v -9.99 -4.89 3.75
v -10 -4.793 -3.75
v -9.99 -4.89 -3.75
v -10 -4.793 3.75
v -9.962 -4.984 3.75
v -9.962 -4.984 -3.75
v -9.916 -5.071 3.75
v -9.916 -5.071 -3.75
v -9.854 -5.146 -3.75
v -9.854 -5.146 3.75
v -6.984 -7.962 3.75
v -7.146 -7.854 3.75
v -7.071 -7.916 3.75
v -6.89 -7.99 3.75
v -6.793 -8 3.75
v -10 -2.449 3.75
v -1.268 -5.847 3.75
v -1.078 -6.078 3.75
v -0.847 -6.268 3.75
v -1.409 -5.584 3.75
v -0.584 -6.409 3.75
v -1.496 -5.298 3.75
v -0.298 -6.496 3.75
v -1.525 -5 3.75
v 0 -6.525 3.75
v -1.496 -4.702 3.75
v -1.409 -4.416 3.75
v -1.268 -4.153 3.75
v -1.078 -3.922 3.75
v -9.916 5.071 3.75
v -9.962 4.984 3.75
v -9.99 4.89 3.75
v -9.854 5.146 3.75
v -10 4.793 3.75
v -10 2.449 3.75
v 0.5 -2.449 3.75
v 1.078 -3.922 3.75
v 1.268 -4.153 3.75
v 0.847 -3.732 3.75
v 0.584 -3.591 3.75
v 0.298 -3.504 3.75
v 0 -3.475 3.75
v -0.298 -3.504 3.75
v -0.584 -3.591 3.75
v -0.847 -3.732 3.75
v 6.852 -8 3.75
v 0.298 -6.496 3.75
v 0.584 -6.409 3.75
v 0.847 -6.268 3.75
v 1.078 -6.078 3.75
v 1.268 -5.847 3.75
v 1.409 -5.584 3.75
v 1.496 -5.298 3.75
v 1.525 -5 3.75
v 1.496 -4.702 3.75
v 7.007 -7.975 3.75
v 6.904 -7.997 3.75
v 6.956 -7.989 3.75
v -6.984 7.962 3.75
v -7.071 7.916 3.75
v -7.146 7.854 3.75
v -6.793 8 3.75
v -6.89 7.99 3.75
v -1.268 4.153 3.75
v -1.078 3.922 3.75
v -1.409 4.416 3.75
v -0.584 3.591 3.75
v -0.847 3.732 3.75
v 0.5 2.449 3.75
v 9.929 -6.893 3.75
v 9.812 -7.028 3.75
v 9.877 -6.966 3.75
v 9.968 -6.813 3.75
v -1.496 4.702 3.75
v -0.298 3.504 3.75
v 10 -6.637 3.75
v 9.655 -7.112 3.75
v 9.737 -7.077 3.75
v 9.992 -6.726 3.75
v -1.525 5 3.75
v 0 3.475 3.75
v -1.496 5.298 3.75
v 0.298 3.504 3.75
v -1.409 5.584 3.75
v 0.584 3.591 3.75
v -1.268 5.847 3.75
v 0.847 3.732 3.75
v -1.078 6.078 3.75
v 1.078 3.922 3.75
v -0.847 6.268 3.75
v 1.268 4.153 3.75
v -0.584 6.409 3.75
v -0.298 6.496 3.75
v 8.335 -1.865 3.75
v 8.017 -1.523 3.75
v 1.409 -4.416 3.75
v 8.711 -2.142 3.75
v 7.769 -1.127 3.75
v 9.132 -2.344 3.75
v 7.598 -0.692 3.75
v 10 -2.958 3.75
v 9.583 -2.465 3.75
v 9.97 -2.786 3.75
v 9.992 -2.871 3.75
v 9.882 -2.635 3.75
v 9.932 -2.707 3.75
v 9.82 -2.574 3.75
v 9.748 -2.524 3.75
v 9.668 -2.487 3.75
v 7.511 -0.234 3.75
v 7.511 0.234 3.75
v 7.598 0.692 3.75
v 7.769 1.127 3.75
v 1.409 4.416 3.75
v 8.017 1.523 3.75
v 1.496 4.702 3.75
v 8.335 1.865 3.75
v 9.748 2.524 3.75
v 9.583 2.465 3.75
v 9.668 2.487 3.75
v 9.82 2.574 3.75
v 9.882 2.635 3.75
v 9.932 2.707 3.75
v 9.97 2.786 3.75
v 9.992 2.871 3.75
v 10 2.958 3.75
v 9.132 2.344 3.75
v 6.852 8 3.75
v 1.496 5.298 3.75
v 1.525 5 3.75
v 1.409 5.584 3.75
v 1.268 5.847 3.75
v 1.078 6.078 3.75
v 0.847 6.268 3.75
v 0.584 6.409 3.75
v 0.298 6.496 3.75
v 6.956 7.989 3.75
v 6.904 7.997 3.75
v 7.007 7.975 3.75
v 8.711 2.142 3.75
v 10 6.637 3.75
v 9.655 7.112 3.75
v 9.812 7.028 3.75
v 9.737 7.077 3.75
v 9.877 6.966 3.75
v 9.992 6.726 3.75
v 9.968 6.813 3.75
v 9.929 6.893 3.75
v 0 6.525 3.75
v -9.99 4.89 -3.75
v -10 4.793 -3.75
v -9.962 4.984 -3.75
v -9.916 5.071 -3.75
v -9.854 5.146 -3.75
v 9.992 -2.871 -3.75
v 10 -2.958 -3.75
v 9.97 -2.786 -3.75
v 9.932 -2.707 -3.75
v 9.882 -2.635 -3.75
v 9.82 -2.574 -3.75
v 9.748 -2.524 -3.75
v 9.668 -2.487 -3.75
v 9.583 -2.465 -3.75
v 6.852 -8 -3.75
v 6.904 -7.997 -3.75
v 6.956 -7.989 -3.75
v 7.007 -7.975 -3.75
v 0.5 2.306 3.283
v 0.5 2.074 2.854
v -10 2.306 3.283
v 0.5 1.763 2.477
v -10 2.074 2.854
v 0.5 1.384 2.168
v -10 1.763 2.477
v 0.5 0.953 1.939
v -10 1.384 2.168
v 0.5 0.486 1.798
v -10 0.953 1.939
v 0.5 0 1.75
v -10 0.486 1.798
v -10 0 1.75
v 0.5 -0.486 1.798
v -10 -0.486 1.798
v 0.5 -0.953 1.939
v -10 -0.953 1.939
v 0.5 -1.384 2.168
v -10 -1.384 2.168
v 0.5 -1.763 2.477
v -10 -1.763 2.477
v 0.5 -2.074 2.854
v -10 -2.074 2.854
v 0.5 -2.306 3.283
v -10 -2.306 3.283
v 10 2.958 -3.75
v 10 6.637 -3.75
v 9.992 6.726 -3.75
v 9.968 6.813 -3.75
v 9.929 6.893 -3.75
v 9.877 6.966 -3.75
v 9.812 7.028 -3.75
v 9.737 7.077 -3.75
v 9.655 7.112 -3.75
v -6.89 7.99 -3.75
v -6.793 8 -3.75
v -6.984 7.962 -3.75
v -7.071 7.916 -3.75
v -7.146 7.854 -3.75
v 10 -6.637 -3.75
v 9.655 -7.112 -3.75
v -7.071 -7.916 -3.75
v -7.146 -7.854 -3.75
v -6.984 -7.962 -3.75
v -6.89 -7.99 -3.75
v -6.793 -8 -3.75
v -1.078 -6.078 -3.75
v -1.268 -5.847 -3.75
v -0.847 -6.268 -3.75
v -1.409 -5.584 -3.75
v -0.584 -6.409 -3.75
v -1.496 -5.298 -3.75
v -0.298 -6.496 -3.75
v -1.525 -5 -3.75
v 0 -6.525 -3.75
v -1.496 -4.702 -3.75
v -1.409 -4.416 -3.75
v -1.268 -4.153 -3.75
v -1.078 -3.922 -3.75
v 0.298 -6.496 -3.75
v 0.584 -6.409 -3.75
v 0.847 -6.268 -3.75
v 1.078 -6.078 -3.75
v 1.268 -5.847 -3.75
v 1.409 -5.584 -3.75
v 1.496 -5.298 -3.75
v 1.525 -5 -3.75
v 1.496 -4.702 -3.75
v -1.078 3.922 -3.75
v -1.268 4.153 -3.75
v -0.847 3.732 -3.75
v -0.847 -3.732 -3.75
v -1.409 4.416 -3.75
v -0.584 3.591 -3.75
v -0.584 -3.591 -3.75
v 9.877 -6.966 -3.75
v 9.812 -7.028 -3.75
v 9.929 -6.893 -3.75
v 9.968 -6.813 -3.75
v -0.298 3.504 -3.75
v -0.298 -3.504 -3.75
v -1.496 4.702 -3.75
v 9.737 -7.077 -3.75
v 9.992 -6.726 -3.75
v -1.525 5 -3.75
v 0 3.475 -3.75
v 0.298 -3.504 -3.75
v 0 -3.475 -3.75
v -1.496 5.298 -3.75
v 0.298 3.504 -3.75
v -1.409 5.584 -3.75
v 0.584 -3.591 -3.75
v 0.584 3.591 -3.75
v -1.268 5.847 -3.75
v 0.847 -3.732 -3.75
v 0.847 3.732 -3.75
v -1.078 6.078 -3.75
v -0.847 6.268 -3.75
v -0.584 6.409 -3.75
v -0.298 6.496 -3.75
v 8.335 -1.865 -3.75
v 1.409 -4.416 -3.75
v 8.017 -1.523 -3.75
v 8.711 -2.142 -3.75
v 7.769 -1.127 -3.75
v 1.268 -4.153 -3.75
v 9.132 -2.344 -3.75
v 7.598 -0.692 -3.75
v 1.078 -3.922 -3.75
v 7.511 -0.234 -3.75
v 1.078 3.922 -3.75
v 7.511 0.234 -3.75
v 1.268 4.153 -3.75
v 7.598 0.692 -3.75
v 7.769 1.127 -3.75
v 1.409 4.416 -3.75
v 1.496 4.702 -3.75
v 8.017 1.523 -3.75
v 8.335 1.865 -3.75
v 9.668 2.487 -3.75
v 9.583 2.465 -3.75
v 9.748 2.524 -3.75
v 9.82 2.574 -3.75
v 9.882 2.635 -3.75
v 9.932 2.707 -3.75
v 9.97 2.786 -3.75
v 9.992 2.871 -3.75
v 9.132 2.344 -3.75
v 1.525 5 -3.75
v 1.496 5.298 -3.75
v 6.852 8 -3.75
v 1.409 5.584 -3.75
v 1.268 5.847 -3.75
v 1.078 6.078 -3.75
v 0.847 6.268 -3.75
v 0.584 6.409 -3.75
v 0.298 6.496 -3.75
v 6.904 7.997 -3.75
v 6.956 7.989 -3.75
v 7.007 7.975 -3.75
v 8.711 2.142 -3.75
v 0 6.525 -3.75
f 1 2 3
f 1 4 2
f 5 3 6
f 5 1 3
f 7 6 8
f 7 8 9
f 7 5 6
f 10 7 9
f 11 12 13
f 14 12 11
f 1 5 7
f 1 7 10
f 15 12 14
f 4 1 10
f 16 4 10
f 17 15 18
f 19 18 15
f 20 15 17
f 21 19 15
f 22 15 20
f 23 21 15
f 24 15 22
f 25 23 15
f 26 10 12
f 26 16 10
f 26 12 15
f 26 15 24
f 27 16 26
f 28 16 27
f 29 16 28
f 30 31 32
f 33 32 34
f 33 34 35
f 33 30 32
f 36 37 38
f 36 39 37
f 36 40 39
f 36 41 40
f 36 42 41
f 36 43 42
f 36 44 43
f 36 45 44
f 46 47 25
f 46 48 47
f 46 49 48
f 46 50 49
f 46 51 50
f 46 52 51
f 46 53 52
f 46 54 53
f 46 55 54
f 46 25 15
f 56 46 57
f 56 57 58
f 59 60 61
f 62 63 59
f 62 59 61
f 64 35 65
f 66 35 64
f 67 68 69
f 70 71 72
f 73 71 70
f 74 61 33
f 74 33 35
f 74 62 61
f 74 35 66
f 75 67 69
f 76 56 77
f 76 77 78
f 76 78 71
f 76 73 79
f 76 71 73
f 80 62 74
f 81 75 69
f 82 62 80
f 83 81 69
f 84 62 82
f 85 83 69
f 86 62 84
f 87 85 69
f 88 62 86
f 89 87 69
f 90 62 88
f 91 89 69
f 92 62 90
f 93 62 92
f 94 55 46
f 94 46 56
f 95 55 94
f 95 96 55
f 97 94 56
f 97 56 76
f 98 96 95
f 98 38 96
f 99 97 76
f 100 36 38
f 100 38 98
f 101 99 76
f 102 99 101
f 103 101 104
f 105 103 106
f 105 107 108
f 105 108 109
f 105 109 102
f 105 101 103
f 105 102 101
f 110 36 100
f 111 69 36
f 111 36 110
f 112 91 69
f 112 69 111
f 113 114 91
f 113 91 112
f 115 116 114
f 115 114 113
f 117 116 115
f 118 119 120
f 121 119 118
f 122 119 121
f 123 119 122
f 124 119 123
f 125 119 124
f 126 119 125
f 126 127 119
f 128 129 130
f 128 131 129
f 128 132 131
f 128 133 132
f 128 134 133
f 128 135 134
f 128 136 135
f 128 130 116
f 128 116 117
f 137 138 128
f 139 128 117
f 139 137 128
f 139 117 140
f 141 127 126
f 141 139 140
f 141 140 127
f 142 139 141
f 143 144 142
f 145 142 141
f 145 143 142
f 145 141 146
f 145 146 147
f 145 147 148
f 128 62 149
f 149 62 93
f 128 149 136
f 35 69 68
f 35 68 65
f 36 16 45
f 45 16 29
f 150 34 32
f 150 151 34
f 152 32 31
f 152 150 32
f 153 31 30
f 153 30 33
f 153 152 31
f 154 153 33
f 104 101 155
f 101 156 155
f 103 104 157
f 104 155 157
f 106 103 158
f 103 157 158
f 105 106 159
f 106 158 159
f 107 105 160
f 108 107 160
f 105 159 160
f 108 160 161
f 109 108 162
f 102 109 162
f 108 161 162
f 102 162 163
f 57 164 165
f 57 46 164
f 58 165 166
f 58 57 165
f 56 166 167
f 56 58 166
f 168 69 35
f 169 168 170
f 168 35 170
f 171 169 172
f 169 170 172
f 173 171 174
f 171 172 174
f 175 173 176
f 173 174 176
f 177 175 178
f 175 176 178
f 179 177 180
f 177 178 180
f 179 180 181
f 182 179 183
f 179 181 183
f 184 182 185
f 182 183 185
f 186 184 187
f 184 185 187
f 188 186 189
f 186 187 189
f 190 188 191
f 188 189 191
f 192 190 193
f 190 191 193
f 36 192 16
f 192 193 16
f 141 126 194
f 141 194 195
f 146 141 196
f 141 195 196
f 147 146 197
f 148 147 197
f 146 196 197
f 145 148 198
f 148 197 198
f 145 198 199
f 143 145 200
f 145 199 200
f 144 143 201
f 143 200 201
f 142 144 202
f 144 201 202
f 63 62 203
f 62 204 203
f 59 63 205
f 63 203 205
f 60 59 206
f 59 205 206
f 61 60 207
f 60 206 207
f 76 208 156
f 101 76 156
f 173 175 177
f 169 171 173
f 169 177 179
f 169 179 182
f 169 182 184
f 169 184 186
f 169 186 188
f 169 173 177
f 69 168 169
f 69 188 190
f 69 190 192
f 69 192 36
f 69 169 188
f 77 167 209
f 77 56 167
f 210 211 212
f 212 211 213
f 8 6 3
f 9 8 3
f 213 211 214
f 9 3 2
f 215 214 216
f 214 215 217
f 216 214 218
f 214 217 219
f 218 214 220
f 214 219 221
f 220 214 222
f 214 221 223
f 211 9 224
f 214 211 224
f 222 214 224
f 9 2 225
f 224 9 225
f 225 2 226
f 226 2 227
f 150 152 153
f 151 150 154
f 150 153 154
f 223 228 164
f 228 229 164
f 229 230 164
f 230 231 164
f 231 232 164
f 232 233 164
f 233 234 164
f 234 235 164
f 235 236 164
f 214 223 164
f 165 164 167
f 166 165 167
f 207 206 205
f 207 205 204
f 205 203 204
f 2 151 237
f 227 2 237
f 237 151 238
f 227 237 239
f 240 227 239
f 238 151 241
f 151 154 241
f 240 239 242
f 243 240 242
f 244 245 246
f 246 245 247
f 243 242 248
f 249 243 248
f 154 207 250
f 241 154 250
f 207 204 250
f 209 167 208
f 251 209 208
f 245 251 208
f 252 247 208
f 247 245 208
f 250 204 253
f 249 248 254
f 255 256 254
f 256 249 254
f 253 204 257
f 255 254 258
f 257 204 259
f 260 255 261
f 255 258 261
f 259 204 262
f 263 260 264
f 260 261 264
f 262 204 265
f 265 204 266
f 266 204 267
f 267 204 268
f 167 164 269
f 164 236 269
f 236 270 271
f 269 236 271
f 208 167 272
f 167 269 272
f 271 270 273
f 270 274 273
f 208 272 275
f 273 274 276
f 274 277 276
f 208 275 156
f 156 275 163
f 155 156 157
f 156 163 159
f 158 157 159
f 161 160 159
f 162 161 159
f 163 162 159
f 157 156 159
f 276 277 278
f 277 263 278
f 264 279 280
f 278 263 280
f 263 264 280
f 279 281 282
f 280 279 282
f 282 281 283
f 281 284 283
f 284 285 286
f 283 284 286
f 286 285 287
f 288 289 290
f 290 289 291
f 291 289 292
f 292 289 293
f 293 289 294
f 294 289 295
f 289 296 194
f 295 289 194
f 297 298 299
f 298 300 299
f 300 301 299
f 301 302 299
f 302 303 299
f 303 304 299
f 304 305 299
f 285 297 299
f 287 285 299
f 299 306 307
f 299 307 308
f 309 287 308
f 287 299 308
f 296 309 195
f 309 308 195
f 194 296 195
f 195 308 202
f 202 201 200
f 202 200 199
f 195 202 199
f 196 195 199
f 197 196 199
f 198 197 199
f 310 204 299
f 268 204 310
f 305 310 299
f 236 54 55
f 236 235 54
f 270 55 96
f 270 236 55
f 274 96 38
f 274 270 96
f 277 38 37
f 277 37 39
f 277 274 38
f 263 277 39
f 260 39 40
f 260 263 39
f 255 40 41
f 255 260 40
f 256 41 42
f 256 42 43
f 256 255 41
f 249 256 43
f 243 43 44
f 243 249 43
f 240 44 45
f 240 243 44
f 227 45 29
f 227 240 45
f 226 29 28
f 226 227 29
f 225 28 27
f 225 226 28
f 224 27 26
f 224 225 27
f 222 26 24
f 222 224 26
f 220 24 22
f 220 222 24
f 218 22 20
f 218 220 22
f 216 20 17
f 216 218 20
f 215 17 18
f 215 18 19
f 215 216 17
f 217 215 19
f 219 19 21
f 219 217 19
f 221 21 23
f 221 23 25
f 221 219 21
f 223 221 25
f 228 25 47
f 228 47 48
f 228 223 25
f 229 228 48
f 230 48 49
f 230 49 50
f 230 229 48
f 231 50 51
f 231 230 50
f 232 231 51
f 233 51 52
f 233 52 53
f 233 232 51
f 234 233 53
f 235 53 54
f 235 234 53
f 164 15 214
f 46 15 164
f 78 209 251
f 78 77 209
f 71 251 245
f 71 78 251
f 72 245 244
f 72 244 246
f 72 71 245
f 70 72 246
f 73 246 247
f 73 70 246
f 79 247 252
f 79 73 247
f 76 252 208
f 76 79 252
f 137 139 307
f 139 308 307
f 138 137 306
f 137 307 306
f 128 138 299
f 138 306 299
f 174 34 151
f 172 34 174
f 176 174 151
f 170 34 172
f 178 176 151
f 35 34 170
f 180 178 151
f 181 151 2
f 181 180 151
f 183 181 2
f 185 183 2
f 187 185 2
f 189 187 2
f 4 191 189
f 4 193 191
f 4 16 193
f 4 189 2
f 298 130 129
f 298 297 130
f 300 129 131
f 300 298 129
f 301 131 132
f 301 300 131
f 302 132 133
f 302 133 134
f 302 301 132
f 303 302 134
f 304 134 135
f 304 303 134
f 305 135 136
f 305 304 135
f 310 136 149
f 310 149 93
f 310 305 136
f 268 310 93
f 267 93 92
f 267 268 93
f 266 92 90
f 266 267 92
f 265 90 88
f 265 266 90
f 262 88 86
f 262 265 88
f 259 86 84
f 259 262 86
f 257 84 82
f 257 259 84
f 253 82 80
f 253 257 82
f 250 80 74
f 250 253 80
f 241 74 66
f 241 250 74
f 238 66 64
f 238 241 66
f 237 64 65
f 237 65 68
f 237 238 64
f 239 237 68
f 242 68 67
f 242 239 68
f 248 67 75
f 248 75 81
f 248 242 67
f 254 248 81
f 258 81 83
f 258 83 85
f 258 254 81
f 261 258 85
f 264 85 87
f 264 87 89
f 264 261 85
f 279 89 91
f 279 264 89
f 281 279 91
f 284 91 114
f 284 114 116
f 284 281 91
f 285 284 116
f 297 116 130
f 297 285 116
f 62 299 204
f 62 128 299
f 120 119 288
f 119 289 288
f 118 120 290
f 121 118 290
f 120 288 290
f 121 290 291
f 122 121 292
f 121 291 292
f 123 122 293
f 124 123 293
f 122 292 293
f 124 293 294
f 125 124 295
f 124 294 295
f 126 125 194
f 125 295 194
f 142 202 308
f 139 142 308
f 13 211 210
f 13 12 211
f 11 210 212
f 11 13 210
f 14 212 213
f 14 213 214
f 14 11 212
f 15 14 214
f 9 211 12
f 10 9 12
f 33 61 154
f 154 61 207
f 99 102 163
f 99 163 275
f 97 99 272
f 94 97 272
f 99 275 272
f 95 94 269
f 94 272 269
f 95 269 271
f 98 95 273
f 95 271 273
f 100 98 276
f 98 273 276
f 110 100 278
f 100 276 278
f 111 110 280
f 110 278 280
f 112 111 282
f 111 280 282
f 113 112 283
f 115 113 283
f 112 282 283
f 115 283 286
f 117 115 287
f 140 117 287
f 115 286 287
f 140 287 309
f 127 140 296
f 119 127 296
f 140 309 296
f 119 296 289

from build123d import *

# Parameters (mm, degrees)
SKETCH_1_R          = 1.525
EXTRUDE_1_DEPTH     = 3.75
SKETCH_2_R          = 2.5
CUT_EXTRUDE_1_DEPTH = 10.5
CHAMFER_1_SIZE      = 3
SKETCH_3_R          = 2.5
CUT_EXTRUDE_2_DEPTH = 15.84082208
FILLET_1_R          = 0.5


with BuildPart() as part:
    # 草图1 → 凸台-拉伸1 (new, symmetric)
    with BuildSketch(Plane.XY):
        Polygon((-10, 8), (-10, -8), (6.931382282, -8), (10, -7), (10, 7), (6.931382282, 8), align=None)
        with Locations((0, 5)):
            Circle(SKETCH_1_R, mode=Mode.SUBTRACT)
        with Locations((0, -5)):
            Circle(SKETCH_1_R, mode=Mode.SUBTRACT)
    extrude(amount=EXTRUDE_1_DEPTH, both=True)

    # 草图2 → 切除-拉伸1 (cut)
    with BuildSketch(Plane.ZY.offset(10)):
        with Locations((4.25, 0)):
            Circle(SKETCH_2_R)
    extrude(amount=-CUT_EXTRUDE_1_DEPTH, mode=Mode.SUBTRACT)

    # 倒角1
    chamfer_1_edges = [part.edges().sort_by_distance(p)[0] for p in [
        (-10, -8, 0),
        (-10, 8, 0),
    ]]
    chamfer(chamfer_1_edges, length=CHAMFER_1_SIZE)

    # 草图3 → 切除-拉伸2 (cut, through all)
    with BuildSketch(Plane(origin=(0, 0, -3.75), x_dir=(-1, 0, 0), z_dir=(0, 0, -1))):
        with Locations((-10, 0)):
            Circle(SKETCH_3_R)
    extrude(amount=-CUT_EXTRUDE_2_DEPTH, mode=Mode.SUBTRACT)

    # 圆角1
    fillet_1_edges = [part.edges().sort_by_distance(p)[0] for p in [
        (6.931382282, 8, 0),
        (10, 7, 0),
        (10, -7, 0),
        (6.931382282, -8, 0),
        (-7, -8, 0),
        (-10, 5, 0),
        (-10, -5, 0),
        (-7, 8, 0),
        (10, -2.5, 0),
        (10, 2.5, 0),
    ]]
    fillet(fillet_1_edges, radius=FILLET_1_R)


solid = part.part
